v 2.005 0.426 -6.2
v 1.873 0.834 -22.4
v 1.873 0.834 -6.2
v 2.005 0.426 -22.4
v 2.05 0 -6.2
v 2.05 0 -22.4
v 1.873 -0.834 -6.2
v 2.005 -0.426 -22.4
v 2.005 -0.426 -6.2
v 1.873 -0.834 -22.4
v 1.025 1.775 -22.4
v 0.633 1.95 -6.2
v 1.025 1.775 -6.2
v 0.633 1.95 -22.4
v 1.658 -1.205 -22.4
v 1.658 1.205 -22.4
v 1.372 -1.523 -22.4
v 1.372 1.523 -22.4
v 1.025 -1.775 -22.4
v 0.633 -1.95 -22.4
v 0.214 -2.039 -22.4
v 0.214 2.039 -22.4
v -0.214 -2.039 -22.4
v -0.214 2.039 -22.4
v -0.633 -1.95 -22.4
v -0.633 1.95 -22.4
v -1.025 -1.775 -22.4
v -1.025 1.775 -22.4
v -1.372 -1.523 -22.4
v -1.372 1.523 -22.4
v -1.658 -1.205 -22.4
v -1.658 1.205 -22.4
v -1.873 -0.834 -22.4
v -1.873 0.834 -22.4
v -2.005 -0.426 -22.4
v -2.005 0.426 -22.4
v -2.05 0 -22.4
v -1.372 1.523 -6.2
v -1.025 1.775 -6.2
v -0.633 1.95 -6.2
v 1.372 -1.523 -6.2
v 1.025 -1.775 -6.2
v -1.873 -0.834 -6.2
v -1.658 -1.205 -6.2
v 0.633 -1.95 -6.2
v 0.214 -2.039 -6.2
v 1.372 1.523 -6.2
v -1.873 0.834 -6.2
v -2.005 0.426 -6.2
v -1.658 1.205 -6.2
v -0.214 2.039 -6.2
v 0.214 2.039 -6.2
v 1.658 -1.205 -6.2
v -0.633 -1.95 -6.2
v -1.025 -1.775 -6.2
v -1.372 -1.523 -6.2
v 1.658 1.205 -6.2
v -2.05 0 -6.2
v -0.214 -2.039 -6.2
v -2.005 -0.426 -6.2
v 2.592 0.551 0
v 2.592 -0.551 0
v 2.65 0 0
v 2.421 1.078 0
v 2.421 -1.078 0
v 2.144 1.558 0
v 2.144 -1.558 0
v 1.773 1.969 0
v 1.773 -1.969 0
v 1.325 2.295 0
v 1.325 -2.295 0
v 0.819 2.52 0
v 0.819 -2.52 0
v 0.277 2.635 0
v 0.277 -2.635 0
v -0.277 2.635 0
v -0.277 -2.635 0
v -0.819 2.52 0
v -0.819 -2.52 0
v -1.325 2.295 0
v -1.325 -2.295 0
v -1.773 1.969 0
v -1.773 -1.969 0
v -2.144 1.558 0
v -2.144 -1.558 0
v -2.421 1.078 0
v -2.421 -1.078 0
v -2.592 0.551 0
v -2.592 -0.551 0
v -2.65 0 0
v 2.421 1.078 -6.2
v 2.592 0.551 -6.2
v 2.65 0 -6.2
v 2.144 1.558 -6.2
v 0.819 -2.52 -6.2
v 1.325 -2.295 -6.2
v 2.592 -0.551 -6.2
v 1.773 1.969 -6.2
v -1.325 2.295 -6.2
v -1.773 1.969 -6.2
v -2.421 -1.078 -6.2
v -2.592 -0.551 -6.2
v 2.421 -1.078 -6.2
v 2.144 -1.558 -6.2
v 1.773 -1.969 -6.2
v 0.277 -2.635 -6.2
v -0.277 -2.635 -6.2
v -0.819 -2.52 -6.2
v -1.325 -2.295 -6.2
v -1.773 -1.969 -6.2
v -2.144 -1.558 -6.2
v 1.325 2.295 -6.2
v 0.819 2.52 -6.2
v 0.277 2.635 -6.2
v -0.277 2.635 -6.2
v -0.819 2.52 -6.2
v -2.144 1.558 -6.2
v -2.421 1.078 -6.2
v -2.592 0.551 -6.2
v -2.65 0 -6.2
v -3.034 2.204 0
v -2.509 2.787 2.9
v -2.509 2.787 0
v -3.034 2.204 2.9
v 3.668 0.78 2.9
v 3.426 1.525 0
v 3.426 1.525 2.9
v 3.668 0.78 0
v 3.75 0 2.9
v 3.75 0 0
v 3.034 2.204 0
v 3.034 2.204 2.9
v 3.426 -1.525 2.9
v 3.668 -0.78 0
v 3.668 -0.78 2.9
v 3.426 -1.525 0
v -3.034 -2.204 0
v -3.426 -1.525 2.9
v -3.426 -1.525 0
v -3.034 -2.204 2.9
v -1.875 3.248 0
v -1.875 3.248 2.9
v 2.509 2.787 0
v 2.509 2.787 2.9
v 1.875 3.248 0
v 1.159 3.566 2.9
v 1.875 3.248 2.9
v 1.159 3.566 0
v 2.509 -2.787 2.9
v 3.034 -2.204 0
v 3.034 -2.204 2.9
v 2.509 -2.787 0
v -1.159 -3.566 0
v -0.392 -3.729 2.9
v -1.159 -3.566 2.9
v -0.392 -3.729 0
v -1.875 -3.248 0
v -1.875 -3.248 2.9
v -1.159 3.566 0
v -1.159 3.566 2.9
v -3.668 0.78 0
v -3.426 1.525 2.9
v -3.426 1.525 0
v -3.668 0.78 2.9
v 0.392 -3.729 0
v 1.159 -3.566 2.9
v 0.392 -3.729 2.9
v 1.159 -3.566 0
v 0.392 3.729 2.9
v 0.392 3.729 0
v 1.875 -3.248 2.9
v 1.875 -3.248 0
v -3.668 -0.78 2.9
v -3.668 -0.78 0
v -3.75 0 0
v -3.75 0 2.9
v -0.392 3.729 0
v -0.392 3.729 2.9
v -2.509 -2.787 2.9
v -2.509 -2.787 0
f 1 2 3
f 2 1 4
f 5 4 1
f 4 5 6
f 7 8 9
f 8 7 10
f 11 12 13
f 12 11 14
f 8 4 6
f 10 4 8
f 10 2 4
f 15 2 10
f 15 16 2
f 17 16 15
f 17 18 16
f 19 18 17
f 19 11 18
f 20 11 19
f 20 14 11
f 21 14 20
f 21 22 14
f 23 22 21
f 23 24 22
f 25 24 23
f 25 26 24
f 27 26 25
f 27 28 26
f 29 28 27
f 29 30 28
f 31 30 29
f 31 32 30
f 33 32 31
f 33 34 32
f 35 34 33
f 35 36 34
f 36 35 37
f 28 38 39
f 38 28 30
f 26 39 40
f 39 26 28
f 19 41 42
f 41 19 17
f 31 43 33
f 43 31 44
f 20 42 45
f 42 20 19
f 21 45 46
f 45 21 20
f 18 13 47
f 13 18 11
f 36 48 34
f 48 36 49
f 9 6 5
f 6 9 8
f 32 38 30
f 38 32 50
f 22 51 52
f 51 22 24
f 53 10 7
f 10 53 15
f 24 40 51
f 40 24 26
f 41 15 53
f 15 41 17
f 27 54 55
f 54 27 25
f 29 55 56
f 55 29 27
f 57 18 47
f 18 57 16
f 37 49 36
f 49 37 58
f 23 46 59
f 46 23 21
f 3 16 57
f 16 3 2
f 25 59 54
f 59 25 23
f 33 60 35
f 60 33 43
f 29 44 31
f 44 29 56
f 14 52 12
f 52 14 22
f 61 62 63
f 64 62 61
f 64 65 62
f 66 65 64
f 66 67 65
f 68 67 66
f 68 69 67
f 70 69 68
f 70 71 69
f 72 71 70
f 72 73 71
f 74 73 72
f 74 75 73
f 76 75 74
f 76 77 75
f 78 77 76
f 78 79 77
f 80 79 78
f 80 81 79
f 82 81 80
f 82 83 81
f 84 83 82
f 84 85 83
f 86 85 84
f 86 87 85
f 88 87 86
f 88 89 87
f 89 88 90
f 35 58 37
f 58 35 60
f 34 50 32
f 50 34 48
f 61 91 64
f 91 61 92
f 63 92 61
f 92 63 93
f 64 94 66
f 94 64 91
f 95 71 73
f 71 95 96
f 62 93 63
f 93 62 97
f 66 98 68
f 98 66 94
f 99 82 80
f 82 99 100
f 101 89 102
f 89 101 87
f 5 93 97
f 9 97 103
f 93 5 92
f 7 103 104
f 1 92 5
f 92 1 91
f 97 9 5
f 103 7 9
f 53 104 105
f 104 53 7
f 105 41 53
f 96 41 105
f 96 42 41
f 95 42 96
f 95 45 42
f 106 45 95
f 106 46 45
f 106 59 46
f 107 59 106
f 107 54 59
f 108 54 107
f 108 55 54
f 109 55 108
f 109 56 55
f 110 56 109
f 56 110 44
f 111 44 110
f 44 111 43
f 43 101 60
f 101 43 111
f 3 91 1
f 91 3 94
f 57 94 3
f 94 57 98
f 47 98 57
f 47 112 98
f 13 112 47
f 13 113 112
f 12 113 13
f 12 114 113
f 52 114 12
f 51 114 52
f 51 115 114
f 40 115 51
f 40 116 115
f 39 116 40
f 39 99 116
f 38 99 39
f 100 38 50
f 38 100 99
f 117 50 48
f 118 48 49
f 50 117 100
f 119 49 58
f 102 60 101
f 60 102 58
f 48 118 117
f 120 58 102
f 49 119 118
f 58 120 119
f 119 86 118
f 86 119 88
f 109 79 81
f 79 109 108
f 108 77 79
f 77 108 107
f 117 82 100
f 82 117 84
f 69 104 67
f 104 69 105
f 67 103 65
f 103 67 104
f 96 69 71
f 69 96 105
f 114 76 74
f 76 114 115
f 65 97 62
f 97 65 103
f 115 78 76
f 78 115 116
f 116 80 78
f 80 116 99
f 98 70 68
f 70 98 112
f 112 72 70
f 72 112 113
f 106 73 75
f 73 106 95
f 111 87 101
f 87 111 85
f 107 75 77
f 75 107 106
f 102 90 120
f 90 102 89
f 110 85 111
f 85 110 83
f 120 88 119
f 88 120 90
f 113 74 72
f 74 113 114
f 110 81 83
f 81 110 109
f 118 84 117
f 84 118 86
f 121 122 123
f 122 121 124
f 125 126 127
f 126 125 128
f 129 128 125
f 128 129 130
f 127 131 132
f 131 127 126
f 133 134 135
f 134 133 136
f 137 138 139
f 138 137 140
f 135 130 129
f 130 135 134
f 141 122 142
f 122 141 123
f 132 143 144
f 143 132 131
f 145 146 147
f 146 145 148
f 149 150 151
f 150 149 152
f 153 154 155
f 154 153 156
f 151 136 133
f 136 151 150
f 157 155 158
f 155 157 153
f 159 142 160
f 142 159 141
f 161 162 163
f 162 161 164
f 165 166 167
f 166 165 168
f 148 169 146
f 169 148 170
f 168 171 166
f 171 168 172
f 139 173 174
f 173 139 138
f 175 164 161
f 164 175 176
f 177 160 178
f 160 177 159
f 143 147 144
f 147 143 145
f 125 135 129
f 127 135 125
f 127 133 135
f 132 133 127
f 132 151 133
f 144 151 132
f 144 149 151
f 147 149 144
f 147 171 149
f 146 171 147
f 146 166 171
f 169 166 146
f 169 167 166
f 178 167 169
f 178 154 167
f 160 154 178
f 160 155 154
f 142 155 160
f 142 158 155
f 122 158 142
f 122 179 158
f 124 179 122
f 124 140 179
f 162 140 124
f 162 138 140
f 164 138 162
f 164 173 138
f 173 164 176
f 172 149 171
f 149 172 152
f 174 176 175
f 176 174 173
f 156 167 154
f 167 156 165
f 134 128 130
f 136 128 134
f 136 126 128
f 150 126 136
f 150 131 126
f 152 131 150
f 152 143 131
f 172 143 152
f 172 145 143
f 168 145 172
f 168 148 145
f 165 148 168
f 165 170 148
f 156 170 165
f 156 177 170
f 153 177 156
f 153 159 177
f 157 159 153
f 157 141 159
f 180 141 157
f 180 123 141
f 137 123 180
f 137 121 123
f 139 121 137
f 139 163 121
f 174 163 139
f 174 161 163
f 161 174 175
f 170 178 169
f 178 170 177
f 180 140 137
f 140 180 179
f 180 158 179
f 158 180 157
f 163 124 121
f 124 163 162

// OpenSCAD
//This is modelling a plastic screw being used as a bolt, and it's got a thicker bit so that it can slide through one side of the grip and then grab onto the other

function HiLoBoltOuterDiameter(3dPrinterTolerance=.4) = 4.5 + 3dPrinterTolerance*2;
function HiLoBoltDiameter(3dPrinterTolerance=.4)= 3.3 + 3dPrinterTolerance*2;
function HiLoBoltLength(3dPrinterTolerance=.4)= 22 + 3dPrinterTolerance;
function HiLoBoltHeadDiameter(3dPrinterTolerance=.4)= 6.7 + 3dPrinterTolerance*2;
function HiLoBoltHeadHeight(3dPrinterTolerance=.4)= 2.5 + 3dPrinterTolerance;

//err on the side of larger tolerances for bolts

module HiLoBolt(3dPrinterTolerance=.4, PlasticWidth=4.2)
{
	union()
	{
		translate([0,0,-HiLoBoltLength(3dPrinterTolerance)])
		{
			union()
			{
				cylinder(h=HiLoBoltLength(3dPrinterTolerance), r=HiLoBoltDiameter(3dPrinterTolerance)/2, $fn=30);
				translate([0,0,HiLoBoltLength(3dPrinterTolerance)-(PlasticWidth+2)])
				{
					cylinder(h=PlasticWidth+2, r=HiLoBoltOuterDiameter(3dPrinterTolerance)/2, $fn=30);
				}
			}
		}
		cylinder(h=HiLoBoltHeadHeight(3dPrinterTolerance), r=HiLoBoltHeadDiameter(3dPrinterTolerance)/2,$fn=30);
	}
}



HiLoBolt(.4,4.2);
